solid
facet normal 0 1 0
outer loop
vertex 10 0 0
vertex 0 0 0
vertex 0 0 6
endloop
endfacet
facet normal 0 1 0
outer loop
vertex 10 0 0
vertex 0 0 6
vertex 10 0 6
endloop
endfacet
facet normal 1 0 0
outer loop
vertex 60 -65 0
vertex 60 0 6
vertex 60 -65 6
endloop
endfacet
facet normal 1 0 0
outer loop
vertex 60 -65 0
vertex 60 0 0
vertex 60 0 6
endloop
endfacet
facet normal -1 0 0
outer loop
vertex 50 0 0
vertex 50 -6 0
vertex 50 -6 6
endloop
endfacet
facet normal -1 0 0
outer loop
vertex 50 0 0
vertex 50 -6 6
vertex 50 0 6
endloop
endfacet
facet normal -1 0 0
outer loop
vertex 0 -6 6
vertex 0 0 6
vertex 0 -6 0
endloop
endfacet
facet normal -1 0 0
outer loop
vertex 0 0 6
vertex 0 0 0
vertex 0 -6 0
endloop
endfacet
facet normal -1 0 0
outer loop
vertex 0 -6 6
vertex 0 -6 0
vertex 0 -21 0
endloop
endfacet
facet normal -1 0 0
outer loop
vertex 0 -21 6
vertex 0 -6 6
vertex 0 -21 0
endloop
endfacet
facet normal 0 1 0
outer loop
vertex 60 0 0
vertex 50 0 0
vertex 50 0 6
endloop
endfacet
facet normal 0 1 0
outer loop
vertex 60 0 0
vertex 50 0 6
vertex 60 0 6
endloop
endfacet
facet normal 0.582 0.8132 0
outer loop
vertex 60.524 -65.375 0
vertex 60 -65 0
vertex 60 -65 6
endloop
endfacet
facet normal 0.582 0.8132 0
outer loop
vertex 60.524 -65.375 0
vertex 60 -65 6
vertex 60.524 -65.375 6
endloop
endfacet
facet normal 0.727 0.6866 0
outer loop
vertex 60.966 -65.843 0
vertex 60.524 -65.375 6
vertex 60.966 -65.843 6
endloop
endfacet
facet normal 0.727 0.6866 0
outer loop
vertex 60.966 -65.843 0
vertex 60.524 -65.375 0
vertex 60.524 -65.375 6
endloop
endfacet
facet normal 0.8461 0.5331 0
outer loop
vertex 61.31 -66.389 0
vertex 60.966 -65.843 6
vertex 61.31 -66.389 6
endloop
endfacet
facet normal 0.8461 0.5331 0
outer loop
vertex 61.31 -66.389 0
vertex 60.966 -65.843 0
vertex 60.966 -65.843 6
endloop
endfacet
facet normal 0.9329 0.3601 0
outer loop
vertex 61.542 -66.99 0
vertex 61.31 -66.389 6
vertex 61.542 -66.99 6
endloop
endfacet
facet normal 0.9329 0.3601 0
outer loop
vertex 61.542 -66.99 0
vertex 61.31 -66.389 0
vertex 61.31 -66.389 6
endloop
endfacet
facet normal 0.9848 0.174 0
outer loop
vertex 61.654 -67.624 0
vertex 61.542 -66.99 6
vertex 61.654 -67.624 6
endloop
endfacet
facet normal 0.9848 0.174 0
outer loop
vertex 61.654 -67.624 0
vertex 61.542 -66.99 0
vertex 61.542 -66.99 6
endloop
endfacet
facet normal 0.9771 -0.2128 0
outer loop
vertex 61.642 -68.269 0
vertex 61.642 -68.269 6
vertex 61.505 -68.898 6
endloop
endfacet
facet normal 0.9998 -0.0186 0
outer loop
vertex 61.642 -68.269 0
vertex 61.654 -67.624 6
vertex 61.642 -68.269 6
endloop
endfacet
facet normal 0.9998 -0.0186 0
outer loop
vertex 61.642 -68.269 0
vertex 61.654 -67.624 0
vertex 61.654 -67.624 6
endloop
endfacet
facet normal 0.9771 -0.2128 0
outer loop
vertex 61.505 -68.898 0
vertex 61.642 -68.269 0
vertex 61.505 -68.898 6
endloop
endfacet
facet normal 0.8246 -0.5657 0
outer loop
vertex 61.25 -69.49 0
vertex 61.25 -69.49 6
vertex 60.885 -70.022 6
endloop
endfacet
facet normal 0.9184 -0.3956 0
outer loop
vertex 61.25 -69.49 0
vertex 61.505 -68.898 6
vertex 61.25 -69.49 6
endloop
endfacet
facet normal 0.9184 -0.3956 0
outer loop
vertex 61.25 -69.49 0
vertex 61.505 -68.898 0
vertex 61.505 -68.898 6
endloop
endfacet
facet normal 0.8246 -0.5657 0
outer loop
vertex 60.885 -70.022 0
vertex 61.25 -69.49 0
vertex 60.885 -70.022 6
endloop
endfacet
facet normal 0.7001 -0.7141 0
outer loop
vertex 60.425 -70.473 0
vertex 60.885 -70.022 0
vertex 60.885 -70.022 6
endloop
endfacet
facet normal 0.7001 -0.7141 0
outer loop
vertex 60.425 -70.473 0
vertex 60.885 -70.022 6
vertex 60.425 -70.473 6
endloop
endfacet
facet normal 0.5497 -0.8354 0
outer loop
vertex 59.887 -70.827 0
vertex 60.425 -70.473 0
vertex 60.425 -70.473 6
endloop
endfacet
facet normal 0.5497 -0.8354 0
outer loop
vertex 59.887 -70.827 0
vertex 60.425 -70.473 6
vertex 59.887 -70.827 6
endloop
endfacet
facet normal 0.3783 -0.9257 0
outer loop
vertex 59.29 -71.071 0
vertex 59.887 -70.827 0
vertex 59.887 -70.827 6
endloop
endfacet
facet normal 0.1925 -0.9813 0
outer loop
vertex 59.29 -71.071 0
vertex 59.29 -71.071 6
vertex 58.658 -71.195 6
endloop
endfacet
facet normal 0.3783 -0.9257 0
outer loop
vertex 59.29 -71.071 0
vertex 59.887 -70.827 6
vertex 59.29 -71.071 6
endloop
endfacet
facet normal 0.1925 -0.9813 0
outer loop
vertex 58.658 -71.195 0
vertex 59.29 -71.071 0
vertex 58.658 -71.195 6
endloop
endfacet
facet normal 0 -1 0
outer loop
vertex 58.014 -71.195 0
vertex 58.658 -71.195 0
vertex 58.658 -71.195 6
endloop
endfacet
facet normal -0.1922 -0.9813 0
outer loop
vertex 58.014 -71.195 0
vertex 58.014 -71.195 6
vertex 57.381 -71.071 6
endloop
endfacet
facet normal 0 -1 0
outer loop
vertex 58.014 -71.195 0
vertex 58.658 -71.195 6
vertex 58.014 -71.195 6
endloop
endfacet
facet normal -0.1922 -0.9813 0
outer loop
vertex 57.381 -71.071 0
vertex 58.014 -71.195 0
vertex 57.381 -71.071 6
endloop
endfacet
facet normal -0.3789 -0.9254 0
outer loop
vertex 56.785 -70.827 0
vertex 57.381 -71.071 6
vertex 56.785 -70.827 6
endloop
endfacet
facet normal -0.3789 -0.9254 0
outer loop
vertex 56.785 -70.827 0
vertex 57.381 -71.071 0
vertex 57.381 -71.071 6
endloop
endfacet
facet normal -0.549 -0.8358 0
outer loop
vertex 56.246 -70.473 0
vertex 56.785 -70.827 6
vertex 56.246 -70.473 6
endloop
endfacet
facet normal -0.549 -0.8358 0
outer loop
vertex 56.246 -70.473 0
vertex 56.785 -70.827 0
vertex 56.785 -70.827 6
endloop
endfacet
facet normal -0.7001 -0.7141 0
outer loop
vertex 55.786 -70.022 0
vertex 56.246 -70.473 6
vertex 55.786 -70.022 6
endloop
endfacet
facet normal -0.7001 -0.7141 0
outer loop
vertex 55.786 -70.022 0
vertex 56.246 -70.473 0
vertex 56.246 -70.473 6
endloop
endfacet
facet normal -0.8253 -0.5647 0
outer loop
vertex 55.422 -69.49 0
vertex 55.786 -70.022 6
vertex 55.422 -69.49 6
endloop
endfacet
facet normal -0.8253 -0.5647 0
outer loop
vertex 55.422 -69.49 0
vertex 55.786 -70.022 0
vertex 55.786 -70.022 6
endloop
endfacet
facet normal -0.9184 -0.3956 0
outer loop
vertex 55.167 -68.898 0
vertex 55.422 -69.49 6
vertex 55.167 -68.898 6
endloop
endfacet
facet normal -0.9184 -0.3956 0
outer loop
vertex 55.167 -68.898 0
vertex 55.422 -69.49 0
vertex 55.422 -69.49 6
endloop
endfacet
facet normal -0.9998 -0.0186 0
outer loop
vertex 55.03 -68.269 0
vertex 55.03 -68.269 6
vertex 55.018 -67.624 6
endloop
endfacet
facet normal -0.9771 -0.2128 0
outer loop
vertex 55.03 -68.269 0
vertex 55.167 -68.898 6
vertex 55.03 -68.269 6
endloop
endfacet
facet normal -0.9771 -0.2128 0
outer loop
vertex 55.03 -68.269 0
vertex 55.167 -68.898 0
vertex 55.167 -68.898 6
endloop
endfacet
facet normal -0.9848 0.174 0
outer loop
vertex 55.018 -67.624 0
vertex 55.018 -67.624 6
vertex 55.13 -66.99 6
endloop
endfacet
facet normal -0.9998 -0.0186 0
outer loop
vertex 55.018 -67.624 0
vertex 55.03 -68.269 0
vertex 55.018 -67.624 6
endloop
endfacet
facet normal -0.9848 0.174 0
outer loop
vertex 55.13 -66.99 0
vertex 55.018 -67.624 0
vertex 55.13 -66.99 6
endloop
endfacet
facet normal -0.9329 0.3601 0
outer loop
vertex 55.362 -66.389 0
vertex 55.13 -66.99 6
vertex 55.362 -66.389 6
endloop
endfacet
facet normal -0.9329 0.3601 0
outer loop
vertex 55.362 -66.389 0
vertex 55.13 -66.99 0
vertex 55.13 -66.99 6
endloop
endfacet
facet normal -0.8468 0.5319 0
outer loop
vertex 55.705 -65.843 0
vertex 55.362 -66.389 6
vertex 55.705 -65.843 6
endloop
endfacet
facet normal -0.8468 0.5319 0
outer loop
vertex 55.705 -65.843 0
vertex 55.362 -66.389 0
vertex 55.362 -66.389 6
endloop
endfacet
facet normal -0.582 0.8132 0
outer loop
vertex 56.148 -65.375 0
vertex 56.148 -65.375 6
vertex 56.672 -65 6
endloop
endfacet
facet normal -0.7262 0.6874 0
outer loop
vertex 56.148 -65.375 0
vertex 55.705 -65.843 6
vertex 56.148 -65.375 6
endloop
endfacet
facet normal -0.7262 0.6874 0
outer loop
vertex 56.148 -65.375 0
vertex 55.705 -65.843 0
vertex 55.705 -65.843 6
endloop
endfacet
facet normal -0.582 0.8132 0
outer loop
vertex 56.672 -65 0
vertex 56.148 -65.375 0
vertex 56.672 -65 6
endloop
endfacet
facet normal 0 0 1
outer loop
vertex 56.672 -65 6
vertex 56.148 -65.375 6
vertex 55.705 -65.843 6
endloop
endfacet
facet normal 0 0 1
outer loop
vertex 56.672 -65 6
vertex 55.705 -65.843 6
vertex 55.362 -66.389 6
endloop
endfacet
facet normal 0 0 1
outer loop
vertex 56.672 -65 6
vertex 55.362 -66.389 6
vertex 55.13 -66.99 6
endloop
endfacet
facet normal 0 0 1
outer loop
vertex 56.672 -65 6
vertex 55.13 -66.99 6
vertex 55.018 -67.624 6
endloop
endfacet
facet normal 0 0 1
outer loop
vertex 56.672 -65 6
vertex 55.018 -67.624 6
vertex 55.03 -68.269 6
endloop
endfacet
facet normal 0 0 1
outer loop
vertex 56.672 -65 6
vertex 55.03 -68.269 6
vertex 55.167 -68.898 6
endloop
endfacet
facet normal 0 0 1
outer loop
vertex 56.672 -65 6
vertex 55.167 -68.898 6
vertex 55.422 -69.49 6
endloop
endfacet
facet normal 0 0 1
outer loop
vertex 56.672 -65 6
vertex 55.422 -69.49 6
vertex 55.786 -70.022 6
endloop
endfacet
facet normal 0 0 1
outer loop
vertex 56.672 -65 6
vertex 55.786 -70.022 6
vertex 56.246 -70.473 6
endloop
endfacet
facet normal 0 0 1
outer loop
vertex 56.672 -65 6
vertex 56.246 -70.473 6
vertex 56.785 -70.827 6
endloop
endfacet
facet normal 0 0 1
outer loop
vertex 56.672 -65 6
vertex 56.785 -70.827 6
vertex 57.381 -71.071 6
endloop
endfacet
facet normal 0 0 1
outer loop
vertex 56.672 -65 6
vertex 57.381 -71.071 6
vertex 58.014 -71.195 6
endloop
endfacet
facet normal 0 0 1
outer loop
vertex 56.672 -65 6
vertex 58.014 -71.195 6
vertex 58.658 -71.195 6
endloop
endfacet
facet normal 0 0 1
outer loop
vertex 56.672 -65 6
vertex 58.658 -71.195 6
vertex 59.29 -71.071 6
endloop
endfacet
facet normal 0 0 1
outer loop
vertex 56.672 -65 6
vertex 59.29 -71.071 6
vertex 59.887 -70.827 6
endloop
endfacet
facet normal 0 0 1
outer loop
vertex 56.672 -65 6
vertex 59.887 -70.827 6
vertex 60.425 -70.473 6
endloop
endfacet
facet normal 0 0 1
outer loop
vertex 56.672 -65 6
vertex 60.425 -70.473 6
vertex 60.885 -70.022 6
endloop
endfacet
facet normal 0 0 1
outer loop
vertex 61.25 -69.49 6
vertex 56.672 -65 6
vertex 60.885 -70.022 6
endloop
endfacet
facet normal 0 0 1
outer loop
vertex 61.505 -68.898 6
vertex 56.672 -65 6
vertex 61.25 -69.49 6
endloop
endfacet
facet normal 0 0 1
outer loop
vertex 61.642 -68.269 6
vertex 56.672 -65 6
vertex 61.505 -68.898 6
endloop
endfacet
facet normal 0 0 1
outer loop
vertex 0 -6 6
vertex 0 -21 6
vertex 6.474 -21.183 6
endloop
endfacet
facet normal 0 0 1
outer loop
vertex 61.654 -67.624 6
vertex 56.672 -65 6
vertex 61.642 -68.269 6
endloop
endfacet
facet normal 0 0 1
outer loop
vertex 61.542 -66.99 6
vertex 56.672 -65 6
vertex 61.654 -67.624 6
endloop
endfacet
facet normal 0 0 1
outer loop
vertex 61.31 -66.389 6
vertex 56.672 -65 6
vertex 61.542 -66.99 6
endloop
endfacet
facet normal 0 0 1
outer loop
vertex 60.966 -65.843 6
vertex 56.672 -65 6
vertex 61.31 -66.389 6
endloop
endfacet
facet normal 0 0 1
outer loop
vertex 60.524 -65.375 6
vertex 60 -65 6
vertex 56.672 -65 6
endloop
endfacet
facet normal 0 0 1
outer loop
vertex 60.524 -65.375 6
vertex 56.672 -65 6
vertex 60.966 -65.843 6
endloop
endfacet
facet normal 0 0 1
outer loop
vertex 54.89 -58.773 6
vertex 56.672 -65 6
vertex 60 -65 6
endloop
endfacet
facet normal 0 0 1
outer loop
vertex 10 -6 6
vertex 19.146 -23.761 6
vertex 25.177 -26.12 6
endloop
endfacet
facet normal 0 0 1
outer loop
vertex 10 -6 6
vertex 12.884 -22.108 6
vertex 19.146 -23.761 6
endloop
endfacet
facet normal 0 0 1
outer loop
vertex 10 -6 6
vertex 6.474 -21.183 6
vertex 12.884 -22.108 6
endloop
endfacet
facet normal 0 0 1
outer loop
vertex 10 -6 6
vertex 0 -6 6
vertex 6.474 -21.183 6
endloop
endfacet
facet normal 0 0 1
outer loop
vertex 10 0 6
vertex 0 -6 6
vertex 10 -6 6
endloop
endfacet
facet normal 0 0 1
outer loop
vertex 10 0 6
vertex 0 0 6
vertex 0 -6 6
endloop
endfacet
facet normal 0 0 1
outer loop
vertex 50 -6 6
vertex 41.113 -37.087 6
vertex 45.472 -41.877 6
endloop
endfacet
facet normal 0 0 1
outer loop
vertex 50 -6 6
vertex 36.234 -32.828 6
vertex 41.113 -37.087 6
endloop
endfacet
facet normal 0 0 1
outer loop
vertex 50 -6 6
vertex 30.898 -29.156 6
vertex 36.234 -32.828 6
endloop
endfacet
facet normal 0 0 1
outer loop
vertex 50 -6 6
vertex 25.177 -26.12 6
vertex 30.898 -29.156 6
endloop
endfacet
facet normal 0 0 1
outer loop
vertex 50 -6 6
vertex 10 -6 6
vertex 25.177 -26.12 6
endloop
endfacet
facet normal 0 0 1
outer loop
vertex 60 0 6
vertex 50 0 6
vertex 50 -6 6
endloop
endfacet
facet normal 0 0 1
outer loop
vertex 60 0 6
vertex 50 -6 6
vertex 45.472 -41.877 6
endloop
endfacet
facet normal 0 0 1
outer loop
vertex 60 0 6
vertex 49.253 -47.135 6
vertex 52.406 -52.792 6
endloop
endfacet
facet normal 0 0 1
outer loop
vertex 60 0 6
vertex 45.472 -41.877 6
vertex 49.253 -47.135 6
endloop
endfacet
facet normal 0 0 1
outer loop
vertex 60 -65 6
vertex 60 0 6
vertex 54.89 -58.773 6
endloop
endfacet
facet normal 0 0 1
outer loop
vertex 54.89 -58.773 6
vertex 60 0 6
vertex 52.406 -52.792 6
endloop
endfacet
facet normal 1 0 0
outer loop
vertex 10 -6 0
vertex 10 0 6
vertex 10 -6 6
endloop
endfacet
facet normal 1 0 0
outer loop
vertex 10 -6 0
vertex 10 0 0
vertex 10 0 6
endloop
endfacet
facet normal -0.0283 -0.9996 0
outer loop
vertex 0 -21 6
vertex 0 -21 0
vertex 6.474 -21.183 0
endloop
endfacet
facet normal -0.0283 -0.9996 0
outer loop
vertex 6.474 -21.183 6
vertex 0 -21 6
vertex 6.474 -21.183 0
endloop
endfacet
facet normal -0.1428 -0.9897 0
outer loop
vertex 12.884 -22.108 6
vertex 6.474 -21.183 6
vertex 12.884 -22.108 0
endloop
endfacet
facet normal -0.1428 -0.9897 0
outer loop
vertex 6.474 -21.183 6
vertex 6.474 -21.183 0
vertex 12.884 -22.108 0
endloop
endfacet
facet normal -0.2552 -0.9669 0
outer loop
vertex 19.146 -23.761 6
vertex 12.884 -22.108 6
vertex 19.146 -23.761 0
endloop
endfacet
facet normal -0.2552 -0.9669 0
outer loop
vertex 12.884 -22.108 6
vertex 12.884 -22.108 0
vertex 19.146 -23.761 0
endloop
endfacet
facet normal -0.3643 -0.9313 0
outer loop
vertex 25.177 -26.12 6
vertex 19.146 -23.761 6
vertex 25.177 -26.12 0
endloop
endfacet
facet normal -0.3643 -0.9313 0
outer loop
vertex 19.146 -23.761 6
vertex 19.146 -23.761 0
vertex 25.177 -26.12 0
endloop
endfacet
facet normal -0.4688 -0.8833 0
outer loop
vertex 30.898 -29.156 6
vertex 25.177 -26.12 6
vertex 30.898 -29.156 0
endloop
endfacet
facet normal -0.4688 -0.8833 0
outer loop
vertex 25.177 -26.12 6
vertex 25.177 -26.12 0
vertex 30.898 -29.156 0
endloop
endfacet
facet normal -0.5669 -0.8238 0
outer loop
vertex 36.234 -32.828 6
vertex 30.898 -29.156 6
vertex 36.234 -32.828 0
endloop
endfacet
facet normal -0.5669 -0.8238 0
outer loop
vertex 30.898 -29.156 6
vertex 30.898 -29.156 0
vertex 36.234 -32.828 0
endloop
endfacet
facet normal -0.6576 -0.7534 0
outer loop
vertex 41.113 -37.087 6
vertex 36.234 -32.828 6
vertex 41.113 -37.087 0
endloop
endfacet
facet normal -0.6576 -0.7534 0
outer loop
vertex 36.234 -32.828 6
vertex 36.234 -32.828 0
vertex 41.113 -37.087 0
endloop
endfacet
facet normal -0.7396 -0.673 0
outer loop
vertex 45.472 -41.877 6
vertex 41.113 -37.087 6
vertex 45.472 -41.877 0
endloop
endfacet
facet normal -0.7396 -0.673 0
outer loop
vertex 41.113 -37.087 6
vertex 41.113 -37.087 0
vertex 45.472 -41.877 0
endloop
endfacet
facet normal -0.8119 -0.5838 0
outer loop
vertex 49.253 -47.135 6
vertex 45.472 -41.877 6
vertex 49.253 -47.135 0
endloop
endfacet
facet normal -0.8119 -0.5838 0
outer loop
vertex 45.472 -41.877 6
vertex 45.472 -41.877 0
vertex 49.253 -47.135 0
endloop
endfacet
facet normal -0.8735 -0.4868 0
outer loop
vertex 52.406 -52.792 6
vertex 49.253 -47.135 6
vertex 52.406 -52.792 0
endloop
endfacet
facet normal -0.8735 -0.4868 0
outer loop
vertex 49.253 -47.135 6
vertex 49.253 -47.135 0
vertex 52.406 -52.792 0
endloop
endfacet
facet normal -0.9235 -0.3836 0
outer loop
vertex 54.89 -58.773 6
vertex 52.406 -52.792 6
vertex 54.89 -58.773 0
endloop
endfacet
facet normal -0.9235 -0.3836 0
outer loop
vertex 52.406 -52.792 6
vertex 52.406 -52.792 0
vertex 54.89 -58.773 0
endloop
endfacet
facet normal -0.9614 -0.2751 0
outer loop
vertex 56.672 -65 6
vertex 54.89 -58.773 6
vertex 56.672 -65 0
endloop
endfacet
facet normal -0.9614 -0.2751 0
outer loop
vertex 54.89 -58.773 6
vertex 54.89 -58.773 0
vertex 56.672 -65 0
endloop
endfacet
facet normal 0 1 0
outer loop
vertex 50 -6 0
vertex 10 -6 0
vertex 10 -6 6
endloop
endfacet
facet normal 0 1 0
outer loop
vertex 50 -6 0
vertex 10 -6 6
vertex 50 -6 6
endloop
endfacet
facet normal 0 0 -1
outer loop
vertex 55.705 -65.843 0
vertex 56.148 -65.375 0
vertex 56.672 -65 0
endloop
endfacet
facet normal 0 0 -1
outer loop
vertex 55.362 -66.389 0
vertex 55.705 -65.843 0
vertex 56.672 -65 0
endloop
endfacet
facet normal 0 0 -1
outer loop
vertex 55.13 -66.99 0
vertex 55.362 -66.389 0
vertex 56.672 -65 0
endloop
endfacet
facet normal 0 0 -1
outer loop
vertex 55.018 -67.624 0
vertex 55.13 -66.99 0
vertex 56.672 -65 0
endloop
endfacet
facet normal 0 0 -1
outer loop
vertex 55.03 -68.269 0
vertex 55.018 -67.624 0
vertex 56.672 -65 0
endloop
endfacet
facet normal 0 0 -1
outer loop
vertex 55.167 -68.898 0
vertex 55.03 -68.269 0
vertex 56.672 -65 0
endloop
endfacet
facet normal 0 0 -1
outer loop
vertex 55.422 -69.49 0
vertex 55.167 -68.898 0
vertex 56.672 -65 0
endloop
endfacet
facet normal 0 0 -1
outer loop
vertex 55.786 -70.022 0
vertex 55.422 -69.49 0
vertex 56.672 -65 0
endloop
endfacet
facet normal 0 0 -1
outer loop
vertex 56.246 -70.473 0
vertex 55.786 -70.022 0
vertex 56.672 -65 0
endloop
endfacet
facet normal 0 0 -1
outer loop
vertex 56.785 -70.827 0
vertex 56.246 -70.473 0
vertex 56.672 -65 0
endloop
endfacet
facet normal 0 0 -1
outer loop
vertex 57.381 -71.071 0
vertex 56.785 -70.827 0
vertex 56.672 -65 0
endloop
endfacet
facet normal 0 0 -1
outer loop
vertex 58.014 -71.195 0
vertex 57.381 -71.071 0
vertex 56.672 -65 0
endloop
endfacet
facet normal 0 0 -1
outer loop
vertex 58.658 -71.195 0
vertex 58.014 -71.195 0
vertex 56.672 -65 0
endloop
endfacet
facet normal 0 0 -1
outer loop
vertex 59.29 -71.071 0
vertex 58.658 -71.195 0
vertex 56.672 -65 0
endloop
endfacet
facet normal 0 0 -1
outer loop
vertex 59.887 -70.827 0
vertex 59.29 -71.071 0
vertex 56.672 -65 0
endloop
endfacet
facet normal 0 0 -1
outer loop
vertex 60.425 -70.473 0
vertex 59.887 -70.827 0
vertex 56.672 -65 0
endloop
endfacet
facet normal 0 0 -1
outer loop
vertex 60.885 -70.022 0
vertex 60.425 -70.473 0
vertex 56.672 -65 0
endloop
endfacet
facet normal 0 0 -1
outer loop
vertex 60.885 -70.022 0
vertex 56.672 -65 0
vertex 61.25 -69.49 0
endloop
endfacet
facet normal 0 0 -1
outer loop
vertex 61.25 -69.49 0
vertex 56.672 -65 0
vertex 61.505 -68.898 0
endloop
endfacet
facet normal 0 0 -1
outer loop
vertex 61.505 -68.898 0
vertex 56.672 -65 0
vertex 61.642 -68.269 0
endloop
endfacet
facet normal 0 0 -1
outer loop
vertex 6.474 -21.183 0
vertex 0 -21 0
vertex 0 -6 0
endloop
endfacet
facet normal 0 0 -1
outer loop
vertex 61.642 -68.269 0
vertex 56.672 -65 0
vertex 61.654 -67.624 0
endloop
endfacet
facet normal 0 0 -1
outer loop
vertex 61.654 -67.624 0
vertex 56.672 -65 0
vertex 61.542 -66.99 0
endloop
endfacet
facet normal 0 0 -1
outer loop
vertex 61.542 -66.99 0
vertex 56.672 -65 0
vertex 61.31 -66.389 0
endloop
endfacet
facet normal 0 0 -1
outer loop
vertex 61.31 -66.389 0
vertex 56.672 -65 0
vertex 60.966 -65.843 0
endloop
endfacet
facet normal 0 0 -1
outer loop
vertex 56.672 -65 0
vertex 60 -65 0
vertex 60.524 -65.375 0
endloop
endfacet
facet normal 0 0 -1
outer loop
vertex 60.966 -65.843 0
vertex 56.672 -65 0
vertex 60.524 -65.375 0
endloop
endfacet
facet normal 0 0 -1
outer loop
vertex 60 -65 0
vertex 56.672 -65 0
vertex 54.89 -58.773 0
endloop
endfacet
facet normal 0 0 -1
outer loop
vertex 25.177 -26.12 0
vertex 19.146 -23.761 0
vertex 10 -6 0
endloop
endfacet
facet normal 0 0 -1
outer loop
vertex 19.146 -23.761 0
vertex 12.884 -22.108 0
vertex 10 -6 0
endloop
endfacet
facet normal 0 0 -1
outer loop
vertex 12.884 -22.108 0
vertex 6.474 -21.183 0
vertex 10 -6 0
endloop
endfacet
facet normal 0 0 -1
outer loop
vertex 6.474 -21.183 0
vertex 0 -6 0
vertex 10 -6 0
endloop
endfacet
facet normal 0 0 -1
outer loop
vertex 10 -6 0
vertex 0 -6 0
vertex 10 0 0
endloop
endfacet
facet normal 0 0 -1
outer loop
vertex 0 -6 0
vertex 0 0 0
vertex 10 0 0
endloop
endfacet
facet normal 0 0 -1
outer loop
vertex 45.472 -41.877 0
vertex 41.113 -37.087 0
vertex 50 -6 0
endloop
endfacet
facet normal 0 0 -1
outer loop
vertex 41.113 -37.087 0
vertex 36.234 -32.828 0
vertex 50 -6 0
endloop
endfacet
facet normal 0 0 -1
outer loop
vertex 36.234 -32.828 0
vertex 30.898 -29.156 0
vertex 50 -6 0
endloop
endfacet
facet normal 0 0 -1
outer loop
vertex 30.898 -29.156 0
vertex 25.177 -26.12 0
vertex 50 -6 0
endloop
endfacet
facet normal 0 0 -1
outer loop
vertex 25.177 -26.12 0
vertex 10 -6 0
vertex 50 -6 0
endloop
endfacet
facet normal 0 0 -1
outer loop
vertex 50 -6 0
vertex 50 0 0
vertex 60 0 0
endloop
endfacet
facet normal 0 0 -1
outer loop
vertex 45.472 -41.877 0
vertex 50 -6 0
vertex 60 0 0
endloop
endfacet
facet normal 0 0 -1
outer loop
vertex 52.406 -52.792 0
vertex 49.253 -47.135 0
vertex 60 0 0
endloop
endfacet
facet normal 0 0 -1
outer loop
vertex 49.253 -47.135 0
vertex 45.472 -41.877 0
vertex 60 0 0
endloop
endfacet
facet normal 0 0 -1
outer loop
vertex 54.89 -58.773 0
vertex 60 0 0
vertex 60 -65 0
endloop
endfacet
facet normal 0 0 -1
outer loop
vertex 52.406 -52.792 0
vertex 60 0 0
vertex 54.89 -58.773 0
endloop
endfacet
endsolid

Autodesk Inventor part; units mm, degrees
ref_plane "YZ Plane" through (0, 0, 0) normal (1, 0, 0) x (0, 1, 0)
ref_plane "XZ Plane" through (0, 0, 0) normal (0, 1, 0) x (-1, 0, 0)
ref_plane "XY Plane" through (0, 0, 0) normal (0, 0, 1) x (1, 0, 0)
sketch "Esquisse1" plane through (0, 0, 0) normal (0, 0, 1) x (1, 0, 0)
  line L0 (60, 0) -> (60, -65)
  line L1 (0, 0) -> (0, -6)
  arc A0 (56.6718, -65) -> (60, -65) centre (58.3359, -67.8823) ccw
  line L2 (0, 0) -> (10, 0)
  line L3 (10, 0) -> (10, -6)
  line L4 (10, -6) -> (50, -6)
  line L5 (50, -6) -> (50, 0)
  line L6 (0, 0) -> (10, 0)
  line L7 (50, 0) -> (60, 0)
  line L8 (0, -6) -> (0, -21)
  arc A1 (56.6718, -65) -> (0, -21) centre (1.6431, -77.3802) ccw
  dimension "d0" = 60
  dimension "d1" = 65
  dimension "d2" = 6
  dimension "d5" = 10
  dimension "d6" = 10
  dimension "d8" = 15
extrude "Extrusion1" add sketch "Esquisse1" along normal blind 6
properties part number "roue_libre"
